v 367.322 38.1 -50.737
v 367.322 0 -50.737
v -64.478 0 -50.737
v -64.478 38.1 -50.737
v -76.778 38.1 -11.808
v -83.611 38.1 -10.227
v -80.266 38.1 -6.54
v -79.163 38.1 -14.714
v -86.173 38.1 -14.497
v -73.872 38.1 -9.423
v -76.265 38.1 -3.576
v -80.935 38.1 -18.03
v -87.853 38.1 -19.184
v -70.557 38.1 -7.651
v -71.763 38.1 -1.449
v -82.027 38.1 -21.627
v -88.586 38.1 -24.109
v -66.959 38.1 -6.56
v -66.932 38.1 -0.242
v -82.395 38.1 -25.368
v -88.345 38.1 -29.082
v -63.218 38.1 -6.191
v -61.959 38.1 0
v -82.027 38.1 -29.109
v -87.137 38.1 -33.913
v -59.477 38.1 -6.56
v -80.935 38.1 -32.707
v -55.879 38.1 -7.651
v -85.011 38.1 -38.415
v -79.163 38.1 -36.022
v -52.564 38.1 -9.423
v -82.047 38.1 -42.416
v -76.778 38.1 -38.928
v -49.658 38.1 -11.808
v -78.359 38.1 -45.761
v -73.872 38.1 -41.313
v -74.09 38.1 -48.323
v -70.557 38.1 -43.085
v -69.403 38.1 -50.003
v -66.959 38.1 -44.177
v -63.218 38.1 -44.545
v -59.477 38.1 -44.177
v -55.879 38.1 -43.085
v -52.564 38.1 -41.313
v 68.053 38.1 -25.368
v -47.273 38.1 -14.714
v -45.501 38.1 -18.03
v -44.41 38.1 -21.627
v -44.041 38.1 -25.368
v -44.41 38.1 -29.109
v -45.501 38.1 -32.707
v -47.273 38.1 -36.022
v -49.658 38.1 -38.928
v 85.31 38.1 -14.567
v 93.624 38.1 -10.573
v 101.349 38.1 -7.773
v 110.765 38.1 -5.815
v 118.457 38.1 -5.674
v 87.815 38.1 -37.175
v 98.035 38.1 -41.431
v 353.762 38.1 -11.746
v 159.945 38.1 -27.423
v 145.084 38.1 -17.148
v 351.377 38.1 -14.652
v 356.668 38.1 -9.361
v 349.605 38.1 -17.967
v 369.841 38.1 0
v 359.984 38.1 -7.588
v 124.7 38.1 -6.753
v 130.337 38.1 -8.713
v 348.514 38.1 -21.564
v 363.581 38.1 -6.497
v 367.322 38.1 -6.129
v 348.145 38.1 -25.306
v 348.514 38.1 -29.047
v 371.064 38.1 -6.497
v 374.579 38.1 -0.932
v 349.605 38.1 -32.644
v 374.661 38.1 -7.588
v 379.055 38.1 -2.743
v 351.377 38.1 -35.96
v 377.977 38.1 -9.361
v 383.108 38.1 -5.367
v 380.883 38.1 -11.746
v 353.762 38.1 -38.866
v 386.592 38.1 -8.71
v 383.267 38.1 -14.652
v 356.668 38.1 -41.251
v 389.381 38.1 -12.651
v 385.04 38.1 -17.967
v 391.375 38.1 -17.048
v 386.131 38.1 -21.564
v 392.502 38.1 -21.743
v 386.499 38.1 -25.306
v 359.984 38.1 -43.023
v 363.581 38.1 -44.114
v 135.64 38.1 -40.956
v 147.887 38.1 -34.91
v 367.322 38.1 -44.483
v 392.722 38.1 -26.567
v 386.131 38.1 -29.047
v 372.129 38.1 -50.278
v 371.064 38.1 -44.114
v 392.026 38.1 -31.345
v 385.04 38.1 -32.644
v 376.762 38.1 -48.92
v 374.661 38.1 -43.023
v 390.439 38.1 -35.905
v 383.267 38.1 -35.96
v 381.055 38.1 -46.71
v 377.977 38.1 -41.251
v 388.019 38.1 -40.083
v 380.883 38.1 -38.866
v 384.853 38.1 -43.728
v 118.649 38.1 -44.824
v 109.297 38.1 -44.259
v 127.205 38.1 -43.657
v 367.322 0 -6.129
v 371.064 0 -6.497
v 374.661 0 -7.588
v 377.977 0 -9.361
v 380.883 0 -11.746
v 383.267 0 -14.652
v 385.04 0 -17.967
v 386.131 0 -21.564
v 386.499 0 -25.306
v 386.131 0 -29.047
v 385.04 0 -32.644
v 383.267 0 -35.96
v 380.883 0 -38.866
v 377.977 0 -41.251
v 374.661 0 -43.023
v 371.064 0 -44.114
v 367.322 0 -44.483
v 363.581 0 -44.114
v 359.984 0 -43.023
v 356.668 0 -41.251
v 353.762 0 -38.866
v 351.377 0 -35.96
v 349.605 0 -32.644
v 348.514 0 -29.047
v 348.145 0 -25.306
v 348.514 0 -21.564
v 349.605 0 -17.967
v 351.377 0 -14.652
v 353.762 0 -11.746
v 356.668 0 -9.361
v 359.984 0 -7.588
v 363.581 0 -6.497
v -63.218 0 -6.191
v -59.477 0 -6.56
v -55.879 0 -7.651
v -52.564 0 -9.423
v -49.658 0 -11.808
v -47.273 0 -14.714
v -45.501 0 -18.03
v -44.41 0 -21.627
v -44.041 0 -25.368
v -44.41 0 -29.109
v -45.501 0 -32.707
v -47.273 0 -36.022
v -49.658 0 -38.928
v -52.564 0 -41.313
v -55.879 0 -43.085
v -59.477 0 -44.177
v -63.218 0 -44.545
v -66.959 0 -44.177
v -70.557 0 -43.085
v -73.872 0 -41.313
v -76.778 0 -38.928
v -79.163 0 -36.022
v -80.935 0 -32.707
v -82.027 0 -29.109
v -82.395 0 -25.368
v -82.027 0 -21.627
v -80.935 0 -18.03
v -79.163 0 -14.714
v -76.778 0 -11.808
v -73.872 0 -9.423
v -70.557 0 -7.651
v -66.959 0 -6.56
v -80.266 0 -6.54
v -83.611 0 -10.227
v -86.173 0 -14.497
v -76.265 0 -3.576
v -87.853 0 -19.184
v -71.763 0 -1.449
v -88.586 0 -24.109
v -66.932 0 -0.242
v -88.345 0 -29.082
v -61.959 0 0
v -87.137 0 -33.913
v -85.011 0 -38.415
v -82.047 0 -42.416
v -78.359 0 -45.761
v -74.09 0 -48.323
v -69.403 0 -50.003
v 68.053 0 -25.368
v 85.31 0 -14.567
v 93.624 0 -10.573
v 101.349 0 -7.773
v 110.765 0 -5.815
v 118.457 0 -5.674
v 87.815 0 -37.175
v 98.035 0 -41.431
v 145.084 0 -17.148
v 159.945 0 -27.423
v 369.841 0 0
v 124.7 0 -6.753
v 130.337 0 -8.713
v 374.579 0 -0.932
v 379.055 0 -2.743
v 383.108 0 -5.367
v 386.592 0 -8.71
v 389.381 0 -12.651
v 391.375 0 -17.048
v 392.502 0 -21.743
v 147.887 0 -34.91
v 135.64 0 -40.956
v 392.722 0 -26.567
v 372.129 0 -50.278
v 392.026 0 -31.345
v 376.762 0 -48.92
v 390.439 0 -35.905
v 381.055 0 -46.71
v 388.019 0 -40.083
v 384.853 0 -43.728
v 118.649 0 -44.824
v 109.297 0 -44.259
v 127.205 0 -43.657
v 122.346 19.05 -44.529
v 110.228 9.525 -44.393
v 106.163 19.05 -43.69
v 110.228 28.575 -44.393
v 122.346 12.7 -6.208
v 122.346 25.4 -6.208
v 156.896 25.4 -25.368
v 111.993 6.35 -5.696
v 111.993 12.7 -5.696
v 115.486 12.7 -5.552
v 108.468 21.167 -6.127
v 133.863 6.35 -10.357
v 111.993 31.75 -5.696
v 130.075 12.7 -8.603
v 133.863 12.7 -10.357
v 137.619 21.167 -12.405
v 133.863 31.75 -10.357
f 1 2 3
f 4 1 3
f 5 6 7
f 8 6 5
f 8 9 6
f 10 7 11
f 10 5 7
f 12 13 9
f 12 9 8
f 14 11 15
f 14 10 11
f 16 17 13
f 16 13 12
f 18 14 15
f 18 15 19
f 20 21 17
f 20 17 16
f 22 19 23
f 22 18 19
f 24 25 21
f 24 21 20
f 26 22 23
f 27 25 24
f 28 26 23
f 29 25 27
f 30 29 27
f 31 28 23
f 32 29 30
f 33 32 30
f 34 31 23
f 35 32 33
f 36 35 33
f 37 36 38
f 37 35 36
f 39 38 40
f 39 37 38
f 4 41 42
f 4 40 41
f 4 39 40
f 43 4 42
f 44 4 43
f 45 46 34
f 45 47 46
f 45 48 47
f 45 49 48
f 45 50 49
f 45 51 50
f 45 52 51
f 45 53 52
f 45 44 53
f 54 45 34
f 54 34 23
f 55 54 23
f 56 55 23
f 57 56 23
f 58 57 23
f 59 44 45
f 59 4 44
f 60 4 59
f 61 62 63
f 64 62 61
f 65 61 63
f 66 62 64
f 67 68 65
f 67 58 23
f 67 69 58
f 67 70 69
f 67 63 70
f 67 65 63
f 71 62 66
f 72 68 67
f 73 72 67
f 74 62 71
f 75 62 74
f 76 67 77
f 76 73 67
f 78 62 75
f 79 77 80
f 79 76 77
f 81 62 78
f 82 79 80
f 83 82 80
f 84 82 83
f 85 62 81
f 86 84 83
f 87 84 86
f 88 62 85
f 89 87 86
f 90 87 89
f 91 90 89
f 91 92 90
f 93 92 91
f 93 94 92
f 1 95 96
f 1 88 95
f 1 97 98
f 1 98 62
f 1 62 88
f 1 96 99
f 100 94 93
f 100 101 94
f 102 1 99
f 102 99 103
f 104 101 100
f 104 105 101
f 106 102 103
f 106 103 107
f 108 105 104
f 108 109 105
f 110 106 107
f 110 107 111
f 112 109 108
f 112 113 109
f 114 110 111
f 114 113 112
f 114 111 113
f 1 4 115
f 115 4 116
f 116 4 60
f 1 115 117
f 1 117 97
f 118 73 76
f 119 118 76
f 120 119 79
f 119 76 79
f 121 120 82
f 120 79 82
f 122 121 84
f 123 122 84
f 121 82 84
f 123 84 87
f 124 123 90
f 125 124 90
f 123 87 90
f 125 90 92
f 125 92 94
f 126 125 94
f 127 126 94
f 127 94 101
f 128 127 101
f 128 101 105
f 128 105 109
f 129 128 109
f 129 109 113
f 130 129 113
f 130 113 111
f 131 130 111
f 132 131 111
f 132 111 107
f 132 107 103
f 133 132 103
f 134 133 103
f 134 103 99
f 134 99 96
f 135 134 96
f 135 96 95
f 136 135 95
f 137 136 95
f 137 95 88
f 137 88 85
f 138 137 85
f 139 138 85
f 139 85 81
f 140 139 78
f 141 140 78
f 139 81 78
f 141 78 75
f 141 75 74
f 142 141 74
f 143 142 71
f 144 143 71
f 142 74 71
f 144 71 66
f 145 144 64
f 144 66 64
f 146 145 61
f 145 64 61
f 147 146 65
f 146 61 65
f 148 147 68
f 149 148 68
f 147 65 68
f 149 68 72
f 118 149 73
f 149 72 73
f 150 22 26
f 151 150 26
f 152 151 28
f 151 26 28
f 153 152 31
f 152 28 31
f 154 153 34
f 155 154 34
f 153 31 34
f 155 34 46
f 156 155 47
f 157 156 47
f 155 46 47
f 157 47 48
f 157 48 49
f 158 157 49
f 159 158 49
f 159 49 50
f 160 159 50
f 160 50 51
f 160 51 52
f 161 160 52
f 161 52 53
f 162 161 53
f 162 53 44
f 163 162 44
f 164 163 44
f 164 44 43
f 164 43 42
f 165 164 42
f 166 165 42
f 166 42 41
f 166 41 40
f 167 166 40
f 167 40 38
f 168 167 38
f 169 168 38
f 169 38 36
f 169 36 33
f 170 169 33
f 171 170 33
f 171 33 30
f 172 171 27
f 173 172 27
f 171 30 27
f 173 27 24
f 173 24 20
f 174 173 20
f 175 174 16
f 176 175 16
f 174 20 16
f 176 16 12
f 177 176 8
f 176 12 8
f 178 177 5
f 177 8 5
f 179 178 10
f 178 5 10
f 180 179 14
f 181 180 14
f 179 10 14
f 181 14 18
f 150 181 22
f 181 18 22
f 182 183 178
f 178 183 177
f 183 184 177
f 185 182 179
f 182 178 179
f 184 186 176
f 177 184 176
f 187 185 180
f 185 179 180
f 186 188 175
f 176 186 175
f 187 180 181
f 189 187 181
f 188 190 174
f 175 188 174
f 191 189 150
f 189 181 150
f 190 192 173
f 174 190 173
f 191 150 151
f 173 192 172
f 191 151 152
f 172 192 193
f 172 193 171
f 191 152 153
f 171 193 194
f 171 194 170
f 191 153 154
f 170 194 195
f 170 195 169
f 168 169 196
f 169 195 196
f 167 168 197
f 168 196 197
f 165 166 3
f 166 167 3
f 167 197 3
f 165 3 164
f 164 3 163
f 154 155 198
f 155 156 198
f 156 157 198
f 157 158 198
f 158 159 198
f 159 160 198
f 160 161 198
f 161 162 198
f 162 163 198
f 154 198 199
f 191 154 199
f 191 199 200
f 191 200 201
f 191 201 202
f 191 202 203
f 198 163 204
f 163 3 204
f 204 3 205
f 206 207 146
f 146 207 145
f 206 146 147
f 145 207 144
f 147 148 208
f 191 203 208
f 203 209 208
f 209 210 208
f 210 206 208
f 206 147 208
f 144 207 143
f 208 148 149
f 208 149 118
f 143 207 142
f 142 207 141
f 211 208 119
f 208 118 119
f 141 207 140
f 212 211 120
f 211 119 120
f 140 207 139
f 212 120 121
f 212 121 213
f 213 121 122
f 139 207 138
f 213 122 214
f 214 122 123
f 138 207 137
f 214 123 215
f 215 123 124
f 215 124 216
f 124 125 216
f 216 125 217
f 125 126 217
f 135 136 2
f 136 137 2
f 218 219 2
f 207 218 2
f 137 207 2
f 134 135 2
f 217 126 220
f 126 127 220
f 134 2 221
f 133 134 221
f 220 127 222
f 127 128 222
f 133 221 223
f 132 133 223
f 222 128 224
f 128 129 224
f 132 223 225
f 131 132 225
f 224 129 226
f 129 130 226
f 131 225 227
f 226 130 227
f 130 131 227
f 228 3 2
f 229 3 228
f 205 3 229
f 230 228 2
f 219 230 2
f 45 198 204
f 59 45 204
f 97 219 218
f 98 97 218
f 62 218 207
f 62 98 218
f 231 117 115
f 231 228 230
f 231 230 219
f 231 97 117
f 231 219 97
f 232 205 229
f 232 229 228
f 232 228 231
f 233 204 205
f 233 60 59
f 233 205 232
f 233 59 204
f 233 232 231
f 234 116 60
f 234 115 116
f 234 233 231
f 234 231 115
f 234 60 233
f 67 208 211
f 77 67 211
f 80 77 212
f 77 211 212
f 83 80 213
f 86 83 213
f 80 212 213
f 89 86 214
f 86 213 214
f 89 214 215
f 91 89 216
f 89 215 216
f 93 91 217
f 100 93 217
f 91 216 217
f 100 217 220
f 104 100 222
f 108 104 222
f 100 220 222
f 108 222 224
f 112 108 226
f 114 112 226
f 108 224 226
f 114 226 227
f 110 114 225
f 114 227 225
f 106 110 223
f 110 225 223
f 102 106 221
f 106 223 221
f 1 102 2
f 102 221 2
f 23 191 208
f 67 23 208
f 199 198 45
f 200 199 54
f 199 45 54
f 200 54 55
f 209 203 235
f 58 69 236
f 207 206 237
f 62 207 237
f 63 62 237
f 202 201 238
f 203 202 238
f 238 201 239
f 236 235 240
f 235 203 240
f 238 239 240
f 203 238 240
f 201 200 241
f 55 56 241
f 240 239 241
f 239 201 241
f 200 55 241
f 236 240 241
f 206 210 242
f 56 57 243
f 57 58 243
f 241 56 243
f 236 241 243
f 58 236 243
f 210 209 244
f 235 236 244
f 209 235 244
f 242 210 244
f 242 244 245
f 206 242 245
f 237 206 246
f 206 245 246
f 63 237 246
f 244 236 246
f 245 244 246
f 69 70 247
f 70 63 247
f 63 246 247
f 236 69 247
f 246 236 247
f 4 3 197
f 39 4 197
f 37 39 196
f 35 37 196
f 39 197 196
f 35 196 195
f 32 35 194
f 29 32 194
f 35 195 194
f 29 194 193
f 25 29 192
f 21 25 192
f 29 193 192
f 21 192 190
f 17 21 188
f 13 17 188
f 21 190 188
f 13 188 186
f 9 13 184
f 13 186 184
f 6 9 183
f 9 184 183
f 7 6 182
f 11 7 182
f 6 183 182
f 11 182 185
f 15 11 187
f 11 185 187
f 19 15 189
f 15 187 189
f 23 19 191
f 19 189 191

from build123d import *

# Parameters (mm, degrees)
SALIENTE_EXTRUIR1_DEPTH = 38.1
CORTAR_EXTRUIR18_DEPTH  = 38.1
CROQUIS4_OUTSIDE_W      = 580.479
CROQUIS4_OUTSIDE_H      = 149.876
CROQUIS4_OUTSIDE_R      = 19.177
CORTAR_EXTRUIR21_DEPTH  = 50.8


with BuildPart() as part:
    # Croquis1 → Saliente-Extruir1 (new body)
    with BuildSketch(Plane(origin=(0, 0, 0), x_dir=(1, 0, 0), z_dir=(0, 1, 0))):
        with BuildLine():
            Line((-61.958802083, 0), (369.841197917, 0))
            ThreePointArc((369.841197917, 0), (392.72185746, 26.5666935), (367.322364583, 50.7365))
            Line((367.322364583, 50.7365), (-64.477635417, 50.7365))
            ThreePointArc((-64.477635417, 50.7365), (-88.58646875, 24.108833333), (-61.958802083, 0))
        make_face()
    extrude(amount=SALIENTE_EXTRUIR1_DEPTH)

    # Croquis3 → Cortar-Extruir18 (cut)
    with BuildSketch(Plane(origin=(0, 38.1, 0), x_dir=(1, 0, 0), z_dir=(0, 1, 0))):
        with BuildLine():
            add(Edge.make_bspline(
                [(68.053382641, 25.36825), (85.128897701, 37.242607365), (117.715779547, 53.529246636), (147.710358419, 35.418129568), (159.94527156, 27.422727745)],
                knots=[0.293668056, 0.293668056, 0.293668056, 0.293668056, 0.509999468, 0.663692502, 0.663692502, 0.663692502, 0.663692502], degree=3))
            add(Edge.make_bspline(
                [(68.053382641, 25.36825), (85.297187869, 13.221681932), (118.362782549, -4.355831371), (146.208725565, 18.171330049), (158.923925731, 26.746070777), (159.94527156, 27.422727745)],
                knots=[0.293535528, 0.293535528, 0.293535528, 0.293535528, 0.509769313, 0.658147643, 0.671041491, 0.671041491, 0.671041491, 0.671041491], degree=3))
        make_face()
    extrude(amount=-CORTAR_EXTRUIR18_DEPTH, mode=Mode.SUBTRACT)

    # Croquis4 outside → Cortar-Extruir21 (cut)
    # profile 1 of 3: a face of its own
    with BuildSketch(Plane(origin=(0, 38.1, 0), x_dir=(1, 0, 0), z_dir=(0, 1, 0))):
        with Locations((152.0675, 25.353)):
            Rectangle(CROQUIS4_OUTSIDE_W, CROQUIS4_OUTSIDE_H)
        with BuildLine():
            Line((-64.477635417, 50.7365), (367.322364583, 50.7365))
            ThreePointArc((367.322364583, 50.7365), (392.72185746, 26.5666935), (369.841197917, 0))
            Line((369.841197917, 0), (-61.958802083, 0))
            ThreePointArc((-61.958802083, 0), (-88.58646875, 24.108833333), (-64.477635417, 50.7365))
        make_face(mode=Mode.SUBTRACT)
    # profile 2 of 3: a face of its own
    with BuildSketch(Plane(origin=(0, 38.1, 0), x_dir=(1, 0, 0), z_dir=(0, 1, 0))):
        with Locations(Location((-63.21821875, 25.36825, 0), (0, 0, 270))):
            Circle(CROQUIS4_OUTSIDE_R)
    # profile 3 of 3: a face of its own
    with BuildSketch(Plane(origin=(0, 38.1, 0), x_dir=(1, 0, 0), z_dir=(0, 1, 0))):
        with Locations(Location((367.322364583, 25.305725768, 0), (0, 0, 270))):
            Circle(CROQUIS4_OUTSIDE_R)
    extrude(amount=-CORTAR_EXTRUIR21_DEPTH, mode=Mode.SUBTRACT)


solid = part.part
